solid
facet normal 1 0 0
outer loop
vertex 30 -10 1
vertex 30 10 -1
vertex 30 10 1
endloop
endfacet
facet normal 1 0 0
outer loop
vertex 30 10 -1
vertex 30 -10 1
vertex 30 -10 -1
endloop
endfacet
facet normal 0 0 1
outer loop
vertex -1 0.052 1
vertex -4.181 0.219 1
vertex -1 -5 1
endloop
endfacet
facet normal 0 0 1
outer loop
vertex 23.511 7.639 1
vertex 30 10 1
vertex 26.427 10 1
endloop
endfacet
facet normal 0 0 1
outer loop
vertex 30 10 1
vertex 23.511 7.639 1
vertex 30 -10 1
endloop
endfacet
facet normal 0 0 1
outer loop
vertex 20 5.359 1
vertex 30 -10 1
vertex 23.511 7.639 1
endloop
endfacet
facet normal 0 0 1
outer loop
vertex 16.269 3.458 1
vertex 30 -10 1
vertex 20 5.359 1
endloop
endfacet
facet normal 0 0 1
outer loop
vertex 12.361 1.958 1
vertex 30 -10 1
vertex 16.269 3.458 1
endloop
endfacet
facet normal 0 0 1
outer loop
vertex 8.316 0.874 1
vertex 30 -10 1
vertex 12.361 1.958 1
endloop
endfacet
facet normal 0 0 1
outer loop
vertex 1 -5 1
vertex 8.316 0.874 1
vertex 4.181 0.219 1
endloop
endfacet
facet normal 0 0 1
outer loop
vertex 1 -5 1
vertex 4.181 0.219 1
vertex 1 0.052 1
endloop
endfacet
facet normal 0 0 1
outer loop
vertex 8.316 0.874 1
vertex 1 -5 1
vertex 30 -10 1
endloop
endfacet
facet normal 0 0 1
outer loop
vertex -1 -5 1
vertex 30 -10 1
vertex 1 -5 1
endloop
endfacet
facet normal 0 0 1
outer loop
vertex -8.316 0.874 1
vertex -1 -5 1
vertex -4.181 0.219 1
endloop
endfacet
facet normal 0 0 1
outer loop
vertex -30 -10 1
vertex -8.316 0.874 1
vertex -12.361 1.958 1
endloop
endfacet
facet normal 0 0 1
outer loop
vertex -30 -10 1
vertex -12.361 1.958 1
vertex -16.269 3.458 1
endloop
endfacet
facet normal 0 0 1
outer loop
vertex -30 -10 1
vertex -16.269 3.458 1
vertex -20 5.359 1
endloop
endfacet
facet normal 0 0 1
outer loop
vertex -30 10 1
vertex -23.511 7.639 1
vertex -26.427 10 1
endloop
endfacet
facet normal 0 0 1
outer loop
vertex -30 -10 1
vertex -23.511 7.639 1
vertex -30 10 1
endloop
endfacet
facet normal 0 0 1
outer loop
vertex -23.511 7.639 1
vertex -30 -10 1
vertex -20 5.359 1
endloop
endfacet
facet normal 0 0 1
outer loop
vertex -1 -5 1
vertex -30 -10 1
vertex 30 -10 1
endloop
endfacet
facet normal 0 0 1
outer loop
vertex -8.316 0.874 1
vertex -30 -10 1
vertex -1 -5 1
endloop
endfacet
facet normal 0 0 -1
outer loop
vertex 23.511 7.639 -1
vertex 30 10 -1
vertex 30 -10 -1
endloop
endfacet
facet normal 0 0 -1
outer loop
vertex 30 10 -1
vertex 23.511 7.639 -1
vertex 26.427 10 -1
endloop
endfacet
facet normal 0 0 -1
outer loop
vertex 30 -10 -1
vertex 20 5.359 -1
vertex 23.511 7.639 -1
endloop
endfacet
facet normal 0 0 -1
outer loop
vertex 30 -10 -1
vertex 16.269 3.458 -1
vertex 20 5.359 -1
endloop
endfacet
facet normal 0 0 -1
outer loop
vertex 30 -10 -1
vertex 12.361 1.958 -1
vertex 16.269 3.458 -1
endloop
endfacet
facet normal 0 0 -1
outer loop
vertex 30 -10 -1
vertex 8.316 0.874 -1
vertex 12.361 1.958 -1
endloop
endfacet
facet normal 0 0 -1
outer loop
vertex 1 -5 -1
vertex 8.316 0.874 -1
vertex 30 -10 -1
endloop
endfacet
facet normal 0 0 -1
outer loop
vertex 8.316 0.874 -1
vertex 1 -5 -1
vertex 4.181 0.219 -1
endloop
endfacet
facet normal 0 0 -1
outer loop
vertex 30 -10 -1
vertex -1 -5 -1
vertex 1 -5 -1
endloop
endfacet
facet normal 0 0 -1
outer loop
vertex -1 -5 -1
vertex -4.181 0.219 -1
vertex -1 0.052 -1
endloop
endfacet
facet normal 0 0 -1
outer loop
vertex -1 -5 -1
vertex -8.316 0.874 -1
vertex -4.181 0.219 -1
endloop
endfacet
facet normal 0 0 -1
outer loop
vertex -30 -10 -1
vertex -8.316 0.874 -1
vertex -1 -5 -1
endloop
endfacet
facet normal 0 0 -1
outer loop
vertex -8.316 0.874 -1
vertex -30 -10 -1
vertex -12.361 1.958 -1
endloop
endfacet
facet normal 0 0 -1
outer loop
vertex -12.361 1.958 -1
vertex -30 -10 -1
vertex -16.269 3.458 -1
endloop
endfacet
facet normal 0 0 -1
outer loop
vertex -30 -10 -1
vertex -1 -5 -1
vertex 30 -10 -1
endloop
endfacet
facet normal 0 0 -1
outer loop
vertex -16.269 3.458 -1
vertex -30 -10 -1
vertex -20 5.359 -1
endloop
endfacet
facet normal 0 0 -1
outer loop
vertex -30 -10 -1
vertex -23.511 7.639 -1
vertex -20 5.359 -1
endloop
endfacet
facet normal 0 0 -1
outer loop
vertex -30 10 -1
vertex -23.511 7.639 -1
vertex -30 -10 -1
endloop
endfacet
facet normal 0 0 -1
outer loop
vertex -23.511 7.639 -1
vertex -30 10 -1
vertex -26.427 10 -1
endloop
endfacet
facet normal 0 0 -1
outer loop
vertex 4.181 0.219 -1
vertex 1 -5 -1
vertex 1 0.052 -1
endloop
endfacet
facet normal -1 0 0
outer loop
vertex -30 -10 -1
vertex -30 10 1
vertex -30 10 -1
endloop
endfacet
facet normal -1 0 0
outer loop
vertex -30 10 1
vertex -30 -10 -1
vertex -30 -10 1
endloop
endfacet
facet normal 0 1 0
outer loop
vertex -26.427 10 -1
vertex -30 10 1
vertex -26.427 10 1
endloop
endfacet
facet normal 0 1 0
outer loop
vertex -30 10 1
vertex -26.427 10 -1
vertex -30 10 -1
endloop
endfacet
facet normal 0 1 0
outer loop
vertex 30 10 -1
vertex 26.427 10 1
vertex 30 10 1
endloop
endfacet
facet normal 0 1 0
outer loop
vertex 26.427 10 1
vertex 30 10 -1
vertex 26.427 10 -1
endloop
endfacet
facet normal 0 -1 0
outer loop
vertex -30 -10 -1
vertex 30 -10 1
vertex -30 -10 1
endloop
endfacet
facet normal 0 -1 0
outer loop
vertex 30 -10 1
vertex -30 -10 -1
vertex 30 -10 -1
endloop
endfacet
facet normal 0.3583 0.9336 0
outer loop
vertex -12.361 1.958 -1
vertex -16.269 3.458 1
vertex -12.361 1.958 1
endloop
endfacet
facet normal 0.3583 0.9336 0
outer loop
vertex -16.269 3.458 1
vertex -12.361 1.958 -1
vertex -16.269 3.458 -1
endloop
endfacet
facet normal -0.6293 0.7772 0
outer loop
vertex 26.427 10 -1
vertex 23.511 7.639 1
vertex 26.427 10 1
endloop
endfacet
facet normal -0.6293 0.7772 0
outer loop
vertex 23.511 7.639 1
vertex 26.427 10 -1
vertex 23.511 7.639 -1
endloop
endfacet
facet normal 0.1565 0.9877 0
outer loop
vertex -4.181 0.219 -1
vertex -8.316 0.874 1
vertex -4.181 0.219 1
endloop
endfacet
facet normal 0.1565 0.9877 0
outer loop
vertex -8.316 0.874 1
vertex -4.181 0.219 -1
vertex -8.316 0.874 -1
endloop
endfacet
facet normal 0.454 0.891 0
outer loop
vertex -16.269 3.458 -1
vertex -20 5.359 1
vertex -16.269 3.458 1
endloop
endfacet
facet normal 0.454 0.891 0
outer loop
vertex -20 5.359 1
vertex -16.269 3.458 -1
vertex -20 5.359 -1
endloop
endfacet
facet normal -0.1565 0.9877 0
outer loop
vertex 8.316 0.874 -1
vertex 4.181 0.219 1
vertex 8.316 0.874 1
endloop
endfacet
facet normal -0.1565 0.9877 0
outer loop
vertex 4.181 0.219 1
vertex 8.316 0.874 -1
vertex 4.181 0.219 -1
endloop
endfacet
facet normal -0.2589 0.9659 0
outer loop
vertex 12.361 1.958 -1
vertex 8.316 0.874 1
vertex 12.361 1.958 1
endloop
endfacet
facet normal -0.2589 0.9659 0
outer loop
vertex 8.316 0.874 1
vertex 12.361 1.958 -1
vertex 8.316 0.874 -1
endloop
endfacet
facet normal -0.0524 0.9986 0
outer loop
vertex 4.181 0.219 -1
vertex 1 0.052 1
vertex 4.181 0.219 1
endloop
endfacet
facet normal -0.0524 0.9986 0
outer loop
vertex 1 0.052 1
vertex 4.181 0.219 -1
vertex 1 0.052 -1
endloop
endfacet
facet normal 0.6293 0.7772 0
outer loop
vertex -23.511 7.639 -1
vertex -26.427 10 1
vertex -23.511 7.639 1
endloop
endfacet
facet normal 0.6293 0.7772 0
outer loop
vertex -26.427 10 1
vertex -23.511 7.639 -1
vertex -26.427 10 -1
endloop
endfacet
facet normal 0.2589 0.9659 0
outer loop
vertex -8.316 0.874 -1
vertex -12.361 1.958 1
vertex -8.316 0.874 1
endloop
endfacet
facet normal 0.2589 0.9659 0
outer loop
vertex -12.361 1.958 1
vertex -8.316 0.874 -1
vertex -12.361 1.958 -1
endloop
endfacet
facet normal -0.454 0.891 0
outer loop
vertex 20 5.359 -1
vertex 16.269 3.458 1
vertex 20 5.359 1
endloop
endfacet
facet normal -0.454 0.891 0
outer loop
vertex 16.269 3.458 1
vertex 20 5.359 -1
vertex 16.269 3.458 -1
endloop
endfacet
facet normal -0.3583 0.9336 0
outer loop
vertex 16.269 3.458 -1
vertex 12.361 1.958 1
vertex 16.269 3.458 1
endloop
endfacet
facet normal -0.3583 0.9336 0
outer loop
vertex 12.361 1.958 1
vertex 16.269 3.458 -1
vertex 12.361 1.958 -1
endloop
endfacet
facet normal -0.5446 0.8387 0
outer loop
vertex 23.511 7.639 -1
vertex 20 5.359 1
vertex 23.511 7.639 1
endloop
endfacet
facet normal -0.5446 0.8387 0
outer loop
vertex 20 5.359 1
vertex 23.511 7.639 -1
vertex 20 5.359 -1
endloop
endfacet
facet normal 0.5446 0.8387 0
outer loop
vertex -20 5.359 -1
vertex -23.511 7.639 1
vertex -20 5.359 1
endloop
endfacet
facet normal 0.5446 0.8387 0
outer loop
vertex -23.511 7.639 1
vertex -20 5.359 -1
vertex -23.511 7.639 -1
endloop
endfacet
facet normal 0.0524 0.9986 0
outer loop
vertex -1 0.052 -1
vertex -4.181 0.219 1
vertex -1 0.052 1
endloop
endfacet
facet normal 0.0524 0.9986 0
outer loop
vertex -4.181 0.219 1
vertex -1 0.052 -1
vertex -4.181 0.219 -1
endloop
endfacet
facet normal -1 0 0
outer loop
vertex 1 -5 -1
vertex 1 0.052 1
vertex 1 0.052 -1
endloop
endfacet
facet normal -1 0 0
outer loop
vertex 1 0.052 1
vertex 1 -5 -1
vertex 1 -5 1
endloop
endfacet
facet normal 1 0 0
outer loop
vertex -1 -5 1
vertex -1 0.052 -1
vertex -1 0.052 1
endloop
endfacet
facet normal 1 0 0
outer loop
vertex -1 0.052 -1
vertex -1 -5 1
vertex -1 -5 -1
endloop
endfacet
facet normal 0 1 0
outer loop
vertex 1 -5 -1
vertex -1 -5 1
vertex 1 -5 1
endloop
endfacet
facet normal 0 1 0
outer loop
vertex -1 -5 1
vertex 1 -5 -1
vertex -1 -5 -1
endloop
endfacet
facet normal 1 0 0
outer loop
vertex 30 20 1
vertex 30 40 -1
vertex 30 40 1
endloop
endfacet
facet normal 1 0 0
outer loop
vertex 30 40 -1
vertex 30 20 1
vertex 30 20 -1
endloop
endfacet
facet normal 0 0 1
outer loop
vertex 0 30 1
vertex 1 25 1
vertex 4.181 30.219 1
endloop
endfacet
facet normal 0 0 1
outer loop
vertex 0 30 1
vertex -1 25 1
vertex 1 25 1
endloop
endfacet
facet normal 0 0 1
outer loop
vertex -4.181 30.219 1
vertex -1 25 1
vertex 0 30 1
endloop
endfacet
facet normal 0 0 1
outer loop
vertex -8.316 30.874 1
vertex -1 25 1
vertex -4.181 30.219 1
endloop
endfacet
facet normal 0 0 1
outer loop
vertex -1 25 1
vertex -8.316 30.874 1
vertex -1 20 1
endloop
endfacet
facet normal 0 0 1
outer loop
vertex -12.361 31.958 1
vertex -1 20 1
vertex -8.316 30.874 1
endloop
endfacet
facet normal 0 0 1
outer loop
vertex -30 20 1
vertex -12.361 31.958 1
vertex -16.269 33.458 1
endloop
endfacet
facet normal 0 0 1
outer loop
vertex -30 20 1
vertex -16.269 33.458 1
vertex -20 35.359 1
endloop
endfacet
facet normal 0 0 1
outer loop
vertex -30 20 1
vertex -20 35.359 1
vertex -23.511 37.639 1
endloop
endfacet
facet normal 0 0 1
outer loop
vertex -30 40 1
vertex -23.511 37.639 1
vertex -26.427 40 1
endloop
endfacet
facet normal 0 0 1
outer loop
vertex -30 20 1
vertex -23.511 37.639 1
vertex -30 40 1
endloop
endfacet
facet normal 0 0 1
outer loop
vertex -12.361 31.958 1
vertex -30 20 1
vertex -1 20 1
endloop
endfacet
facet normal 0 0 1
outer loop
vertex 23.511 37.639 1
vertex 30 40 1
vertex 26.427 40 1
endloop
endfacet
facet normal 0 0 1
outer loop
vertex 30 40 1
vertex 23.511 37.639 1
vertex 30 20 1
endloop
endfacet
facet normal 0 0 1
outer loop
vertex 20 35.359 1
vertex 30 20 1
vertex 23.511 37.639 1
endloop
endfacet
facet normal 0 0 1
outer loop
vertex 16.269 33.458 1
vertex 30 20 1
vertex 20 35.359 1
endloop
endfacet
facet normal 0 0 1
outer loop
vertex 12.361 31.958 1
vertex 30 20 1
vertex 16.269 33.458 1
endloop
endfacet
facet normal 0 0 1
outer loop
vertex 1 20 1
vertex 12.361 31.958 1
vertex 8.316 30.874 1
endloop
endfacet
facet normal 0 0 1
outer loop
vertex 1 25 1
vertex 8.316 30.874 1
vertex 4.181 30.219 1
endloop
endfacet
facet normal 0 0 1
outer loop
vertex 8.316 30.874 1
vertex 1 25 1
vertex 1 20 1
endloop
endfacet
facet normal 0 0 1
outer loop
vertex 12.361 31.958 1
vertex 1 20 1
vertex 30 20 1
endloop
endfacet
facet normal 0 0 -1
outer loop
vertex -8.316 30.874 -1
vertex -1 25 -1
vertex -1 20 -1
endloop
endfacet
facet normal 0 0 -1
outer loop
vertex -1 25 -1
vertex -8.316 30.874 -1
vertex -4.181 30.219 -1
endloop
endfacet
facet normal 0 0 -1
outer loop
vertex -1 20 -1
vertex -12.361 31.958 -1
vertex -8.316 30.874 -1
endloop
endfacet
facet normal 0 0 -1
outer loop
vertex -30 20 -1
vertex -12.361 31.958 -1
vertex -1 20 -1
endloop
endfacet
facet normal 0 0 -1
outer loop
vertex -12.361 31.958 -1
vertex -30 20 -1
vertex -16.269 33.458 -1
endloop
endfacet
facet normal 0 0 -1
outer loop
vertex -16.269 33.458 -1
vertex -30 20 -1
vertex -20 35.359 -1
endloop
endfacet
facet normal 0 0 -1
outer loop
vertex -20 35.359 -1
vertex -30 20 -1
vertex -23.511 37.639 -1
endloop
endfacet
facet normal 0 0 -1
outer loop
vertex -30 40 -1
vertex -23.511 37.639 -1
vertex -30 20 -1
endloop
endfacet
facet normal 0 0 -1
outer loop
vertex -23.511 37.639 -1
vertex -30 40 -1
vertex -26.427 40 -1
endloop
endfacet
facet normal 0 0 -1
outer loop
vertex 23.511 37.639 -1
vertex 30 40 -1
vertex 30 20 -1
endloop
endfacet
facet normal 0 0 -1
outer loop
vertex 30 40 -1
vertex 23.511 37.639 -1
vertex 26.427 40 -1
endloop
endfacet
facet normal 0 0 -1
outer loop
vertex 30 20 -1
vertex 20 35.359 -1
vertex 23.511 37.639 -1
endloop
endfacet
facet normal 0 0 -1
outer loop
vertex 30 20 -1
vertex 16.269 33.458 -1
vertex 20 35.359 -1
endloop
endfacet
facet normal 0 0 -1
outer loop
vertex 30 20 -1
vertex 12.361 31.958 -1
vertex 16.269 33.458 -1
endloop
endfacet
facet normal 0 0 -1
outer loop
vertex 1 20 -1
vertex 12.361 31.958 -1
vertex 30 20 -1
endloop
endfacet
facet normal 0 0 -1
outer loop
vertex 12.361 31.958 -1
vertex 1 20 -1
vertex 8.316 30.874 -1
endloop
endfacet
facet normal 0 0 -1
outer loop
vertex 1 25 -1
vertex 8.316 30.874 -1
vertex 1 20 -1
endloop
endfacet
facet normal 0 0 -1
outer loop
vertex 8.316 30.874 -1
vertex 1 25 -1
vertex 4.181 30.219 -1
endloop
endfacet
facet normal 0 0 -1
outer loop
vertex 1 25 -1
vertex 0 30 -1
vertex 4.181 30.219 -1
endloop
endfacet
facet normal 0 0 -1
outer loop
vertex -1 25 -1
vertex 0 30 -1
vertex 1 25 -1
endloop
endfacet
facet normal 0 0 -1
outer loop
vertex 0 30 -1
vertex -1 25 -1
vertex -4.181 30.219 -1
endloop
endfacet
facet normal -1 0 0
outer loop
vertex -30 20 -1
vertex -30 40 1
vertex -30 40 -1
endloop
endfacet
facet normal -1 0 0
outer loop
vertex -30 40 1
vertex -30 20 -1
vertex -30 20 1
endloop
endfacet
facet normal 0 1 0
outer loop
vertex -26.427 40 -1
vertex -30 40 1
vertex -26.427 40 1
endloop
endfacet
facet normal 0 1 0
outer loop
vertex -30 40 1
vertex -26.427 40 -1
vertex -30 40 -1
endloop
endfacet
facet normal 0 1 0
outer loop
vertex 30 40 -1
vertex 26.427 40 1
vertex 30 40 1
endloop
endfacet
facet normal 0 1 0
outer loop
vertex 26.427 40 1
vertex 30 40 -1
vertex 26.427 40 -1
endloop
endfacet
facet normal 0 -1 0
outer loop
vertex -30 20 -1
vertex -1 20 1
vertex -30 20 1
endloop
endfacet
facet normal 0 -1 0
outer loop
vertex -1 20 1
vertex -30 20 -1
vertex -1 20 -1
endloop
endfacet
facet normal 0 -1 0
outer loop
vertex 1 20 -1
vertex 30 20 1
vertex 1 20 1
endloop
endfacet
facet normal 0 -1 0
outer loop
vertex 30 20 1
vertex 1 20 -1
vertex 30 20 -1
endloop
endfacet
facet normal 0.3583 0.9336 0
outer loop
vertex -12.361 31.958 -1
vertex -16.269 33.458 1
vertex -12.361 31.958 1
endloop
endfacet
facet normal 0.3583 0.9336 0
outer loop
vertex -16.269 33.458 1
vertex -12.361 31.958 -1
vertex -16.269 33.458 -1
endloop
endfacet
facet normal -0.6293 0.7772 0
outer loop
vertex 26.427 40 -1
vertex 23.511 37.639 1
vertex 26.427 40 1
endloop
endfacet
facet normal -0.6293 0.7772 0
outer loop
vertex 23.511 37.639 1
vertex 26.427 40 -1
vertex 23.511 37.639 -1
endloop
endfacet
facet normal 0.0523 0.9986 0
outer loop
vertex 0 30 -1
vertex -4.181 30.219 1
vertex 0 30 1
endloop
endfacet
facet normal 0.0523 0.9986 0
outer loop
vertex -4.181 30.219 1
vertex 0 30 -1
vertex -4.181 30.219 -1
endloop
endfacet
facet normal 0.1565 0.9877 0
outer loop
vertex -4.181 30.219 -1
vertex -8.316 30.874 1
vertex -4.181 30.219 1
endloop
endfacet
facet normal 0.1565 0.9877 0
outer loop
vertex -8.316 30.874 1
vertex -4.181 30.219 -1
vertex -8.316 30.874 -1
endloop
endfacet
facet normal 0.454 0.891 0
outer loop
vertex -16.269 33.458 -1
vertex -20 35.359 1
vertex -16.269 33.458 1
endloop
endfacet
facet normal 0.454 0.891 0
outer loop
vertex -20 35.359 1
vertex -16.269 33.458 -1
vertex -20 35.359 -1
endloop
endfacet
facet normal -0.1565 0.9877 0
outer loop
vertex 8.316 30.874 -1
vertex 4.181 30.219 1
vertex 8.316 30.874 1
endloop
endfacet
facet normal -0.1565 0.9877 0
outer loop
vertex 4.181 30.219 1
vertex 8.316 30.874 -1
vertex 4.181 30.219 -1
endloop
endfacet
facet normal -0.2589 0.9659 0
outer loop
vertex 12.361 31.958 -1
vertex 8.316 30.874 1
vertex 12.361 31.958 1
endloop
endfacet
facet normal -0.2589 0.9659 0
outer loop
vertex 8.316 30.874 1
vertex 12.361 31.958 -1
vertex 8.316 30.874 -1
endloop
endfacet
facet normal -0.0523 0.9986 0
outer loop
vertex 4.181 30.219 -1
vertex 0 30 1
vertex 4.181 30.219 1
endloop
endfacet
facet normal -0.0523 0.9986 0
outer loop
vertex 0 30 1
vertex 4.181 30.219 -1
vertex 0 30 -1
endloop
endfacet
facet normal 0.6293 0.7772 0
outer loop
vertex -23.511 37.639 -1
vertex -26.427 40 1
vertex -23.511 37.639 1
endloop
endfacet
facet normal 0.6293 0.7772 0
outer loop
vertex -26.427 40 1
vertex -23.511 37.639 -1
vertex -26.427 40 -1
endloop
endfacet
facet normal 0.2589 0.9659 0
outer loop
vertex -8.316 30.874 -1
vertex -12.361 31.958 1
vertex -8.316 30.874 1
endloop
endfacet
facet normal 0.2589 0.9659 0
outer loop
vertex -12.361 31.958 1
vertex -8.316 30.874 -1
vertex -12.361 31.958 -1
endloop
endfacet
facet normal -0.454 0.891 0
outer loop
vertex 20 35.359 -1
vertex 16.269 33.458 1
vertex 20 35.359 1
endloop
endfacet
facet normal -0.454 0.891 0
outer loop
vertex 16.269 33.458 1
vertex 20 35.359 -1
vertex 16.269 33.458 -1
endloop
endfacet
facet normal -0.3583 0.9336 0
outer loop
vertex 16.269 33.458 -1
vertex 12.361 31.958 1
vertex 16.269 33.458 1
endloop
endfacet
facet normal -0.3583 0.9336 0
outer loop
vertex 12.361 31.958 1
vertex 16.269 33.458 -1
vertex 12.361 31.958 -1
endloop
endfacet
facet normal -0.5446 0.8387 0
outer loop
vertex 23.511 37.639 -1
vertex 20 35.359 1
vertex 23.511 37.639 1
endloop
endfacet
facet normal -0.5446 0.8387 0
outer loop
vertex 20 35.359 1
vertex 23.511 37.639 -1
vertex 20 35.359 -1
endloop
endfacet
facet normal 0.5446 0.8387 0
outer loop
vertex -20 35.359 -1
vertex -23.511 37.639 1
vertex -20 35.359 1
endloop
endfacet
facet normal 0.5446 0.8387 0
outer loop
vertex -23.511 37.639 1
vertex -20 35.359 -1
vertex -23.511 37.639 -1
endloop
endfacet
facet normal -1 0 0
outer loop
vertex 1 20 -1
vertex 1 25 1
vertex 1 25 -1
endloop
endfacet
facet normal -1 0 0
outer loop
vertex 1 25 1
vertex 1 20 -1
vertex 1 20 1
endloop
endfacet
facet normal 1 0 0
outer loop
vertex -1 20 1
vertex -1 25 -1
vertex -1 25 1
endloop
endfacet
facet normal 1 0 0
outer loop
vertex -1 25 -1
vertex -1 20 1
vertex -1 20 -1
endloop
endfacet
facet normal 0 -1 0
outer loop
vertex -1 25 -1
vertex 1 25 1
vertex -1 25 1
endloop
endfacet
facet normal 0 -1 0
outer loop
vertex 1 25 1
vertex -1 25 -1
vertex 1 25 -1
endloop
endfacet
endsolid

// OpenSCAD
difference(){
    cube([60,20,2],center=true);
    translate([0,40,0])
    cylinder(d=80,h=4,center=true,$fn=60);
    cube([2,10,2],center=true);
    }

translate([0,30,0])
difference(){
    cube([60,20,2],center=true);
    translate([0,40,0])
    cylinder(d=80,h=4,center=true,$fn=60);
    translate([0,-10,0])
    cube([2,10,2],center=true);
    }
